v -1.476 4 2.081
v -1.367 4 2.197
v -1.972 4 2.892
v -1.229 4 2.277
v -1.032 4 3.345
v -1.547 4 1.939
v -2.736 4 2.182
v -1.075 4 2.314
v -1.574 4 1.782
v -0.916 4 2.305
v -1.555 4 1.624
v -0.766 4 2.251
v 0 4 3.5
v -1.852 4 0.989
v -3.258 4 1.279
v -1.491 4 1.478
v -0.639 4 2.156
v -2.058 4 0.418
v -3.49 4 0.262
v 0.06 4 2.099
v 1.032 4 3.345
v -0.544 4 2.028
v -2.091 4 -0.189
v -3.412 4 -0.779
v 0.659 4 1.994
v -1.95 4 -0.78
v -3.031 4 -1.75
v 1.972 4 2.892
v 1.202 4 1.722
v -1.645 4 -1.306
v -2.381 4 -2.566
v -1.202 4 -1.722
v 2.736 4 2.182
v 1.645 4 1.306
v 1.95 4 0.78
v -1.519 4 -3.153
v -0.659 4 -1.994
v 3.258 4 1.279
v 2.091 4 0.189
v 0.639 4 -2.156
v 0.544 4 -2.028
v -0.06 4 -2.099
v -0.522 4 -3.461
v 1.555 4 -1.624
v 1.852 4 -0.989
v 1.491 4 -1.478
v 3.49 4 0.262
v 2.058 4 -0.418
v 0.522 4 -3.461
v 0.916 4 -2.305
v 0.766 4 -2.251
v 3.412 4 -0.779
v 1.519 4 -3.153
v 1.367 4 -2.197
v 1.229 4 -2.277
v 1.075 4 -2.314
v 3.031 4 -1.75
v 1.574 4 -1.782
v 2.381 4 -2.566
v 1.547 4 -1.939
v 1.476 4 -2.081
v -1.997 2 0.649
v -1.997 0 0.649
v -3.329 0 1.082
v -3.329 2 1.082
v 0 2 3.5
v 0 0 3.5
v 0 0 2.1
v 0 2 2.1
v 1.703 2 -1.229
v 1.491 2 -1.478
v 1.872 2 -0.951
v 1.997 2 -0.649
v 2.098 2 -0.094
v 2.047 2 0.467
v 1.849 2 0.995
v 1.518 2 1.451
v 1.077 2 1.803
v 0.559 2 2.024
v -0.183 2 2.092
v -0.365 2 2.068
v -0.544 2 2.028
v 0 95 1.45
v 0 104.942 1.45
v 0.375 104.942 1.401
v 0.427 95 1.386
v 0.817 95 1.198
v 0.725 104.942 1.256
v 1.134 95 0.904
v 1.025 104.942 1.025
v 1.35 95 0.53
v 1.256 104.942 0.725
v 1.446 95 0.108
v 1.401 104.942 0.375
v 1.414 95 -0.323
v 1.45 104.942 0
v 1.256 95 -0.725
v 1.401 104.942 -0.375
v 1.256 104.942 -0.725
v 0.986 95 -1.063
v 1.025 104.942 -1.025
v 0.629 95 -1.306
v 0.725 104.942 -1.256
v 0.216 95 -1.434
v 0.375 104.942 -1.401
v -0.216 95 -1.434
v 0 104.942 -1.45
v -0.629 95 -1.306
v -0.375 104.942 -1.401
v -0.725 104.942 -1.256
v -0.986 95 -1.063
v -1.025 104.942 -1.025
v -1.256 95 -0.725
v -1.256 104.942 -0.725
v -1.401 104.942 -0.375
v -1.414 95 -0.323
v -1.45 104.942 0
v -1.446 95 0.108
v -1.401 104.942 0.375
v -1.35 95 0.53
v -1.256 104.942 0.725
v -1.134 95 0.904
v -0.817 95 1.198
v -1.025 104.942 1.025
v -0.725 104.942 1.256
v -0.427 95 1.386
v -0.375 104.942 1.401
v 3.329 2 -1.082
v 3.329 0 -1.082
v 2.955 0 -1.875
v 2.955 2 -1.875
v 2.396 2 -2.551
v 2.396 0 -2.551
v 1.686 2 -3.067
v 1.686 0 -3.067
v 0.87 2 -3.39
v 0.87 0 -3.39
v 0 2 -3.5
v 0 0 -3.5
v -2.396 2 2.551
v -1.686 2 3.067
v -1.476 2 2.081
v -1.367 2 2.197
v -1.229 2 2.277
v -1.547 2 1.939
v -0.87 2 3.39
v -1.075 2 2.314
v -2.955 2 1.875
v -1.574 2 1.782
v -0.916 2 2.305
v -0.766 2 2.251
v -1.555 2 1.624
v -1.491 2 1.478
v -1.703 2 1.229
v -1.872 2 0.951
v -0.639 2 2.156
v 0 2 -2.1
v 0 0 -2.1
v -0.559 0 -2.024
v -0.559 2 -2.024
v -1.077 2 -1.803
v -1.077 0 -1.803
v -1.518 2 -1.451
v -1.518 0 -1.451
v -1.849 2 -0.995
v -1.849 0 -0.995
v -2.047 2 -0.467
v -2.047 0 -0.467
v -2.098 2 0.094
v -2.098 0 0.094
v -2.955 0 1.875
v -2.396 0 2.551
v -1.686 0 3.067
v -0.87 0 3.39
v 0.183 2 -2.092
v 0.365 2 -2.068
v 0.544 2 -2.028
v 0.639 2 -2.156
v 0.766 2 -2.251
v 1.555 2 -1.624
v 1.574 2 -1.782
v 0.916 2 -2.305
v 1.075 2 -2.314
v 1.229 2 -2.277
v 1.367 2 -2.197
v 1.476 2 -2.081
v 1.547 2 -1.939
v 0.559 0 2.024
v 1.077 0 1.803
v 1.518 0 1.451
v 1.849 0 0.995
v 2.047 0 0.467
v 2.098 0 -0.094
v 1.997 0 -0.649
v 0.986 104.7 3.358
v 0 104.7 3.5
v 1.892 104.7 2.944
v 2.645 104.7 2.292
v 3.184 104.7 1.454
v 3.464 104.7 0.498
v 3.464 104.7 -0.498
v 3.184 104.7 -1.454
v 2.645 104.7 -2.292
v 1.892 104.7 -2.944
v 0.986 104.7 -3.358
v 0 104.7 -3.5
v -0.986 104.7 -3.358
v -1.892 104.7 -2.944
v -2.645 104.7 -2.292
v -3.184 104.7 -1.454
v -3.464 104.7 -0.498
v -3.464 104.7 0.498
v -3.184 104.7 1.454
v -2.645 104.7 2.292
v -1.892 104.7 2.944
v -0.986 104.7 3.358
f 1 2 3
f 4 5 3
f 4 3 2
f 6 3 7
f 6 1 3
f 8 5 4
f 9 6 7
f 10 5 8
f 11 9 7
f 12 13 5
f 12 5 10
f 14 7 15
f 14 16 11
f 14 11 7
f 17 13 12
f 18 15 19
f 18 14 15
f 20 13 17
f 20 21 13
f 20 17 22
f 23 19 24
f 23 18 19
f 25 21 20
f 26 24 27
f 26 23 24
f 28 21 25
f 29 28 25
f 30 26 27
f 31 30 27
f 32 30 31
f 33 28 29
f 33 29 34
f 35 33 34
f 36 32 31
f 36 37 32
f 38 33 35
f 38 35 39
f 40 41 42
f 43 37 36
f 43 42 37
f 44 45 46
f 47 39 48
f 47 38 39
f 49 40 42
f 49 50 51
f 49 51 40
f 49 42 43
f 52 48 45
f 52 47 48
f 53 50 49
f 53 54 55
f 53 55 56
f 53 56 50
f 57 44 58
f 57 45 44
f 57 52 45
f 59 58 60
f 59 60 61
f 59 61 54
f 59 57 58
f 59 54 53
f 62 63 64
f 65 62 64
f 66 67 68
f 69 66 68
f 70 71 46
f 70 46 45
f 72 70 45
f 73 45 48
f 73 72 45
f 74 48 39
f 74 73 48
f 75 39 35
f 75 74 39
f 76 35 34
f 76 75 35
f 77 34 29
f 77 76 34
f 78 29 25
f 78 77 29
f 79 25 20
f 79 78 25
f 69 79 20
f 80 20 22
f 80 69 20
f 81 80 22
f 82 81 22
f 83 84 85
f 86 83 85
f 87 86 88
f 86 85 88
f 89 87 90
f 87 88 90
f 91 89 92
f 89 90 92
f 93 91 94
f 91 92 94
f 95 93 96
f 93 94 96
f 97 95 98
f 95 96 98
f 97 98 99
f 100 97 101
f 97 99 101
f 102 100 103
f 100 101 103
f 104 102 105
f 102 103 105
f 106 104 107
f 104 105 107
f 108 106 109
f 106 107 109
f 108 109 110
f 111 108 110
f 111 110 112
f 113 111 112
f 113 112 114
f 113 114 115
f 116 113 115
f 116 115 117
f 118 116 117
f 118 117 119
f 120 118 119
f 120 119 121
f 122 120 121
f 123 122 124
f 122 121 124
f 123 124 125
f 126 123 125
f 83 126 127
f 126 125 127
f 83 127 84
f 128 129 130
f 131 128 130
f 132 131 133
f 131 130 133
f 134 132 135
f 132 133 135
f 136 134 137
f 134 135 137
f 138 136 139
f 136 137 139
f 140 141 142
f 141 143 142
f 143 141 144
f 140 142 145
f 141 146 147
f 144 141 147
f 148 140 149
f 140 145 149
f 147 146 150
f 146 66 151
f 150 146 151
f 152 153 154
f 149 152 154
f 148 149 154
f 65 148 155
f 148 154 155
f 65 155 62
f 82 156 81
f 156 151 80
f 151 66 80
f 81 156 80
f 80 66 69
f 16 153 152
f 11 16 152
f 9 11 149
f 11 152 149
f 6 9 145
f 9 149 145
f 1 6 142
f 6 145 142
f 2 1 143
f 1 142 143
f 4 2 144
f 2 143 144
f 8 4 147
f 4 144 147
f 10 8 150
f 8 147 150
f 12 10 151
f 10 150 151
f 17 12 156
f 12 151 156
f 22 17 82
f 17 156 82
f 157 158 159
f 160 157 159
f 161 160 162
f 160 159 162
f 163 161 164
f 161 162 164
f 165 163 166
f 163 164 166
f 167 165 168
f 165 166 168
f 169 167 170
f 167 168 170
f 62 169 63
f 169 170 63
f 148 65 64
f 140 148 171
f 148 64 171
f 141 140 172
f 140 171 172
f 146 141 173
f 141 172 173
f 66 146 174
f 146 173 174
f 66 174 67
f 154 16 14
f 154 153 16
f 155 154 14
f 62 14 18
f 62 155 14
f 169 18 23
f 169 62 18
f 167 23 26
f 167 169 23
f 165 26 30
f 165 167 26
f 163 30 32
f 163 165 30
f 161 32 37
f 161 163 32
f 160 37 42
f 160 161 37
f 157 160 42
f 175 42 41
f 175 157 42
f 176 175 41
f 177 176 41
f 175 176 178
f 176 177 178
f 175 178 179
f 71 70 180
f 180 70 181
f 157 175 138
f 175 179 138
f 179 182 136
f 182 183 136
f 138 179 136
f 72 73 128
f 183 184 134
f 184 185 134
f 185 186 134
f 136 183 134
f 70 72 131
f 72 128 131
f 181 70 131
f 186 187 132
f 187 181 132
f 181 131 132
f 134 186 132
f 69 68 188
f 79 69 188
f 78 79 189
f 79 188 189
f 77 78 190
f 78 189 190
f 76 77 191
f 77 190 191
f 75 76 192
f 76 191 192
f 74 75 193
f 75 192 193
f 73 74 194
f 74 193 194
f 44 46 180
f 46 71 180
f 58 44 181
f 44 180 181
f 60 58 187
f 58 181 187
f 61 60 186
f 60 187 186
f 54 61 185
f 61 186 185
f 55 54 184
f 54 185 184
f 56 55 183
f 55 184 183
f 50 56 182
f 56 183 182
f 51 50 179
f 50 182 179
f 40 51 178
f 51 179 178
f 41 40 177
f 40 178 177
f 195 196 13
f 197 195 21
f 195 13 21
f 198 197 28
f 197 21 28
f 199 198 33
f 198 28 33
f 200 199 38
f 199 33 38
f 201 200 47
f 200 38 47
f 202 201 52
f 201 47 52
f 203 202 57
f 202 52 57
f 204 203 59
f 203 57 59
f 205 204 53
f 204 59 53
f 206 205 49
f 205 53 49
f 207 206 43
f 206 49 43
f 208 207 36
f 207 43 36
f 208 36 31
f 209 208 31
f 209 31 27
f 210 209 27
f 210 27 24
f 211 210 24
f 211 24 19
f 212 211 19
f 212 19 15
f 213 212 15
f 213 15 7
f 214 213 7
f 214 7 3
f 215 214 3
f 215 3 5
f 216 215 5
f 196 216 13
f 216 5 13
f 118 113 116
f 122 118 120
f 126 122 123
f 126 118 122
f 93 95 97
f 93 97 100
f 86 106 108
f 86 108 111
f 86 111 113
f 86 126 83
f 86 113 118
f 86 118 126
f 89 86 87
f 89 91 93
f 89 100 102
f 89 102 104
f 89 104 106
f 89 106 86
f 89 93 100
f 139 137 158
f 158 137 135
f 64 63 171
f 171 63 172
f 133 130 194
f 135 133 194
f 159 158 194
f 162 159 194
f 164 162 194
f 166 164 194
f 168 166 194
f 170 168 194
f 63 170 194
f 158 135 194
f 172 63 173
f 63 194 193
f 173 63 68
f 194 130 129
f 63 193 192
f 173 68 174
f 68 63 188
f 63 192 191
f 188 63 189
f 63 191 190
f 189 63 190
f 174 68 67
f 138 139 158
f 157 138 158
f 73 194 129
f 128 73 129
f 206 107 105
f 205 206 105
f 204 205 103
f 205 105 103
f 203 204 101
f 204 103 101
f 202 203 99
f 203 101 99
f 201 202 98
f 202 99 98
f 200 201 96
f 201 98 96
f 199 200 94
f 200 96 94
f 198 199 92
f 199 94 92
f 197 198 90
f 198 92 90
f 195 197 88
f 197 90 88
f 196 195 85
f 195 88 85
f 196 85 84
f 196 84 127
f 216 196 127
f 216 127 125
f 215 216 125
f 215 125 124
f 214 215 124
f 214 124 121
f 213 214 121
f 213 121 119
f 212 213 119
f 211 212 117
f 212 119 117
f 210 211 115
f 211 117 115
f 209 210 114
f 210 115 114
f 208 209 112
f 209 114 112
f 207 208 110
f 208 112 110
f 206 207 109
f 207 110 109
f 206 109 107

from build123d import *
from build123d.topology import SkipClean

# Parameters (mm, degrees)
SKETCH_1_R          = 3.5
EXTRUDE_1_DEPTH     = 105
CUT_EXTRUDE_1_DEPTH = 2
SKETCH_3_R          = 3.5
SKETCH_3_R_2        = 2.1
CUT_EXTRUDE_3_DEPTH = 2
SKETCH_4_R          = 0.548210007
EXTRUDE_2_DEPTH     = 2
SKETCH_5_R          = 1.45
CUT_EXTRUDE_5_DEPTH = 10


with BuildPart() as part:
    # 草图1 → 凸台-拉伸1 (new body)
    with BuildSketch(Plane(origin=(0, 0, 0), x_dir=(1, 0, 0), z_dir=(0, 1, 0))):
        with Locations(Location((0, 0, 0), (0, 0, 270))):
            Circle(SKETCH_1_R)
    extrude(amount=EXTRUDE_1_DEPTH)

    # 草图2 → 切除-拉伸1 (cut)
    with BuildSketch(Plane.XZ):
        with BuildLine():
            Line((0, 3.5), (0, 2.1))
            ThreePointArc((0, 2.1), (1.698935688, 1.23434903), (1.997218684, -0.648935688))
            Line((1.997218684, -0.648935688), (3.328697807, -1.08155948))
            ThreePointArc((3.328697807, -1.08155948), (3.456909192, -0.547520628), (3.5, 0))
            ThreePointArc((3.5, 0), (2.474873734, 2.474873734), (0, 3.5))
        make_face()
        with BuildLine():
            ThreePointArc((0, -2.1), (-1.698935688, -1.23434903), (-1.997218684, 0.648935688))
            Line((-1.997218684, 0.648935688), (-3.328697807, 1.08155948))
            ThreePointArc((-3.328697807, 1.08155948), (-2.83155948, -2.057248383), (0, -3.5))
            Line((0, -3.5), (0, -2.1))
        make_face()
    extrude(amount=-CUT_EXTRUDE_1_DEPTH, mode=Mode.SUBTRACT)

    # 草图3 → 切除-拉伸3 (cut)
    with SkipClean():  # the faces are left unmerged after this step: merging them gives an invalid solid
        with BuildSketch(Plane.XZ.offset(-2)):
            with Locations(Location((0, 0, 0), (0, 0, 270))):
                Circle(SKETCH_3_R)
            with Locations(Location((0, 0, 0), (0, 0, 270))):
                Circle(SKETCH_3_R_2, mode=Mode.SUBTRACT)
        extrude(amount=-CUT_EXTRUDE_3_DEPTH, mode=Mode.SUBTRACT)

    # 草图4 → 凸台-拉伸2 (add)
    with BuildSketch(Plane(origin=(0, 2, 0), x_dir=(1, 0, 0), z_dir=(0, 1, 0))):
        with BuildLine():
            ThreePointArc((-1.491392248, -1.478427936), (-1.053967002, -1.816357222), (-0.543519995, -2.028444235))
            ThreePointArc((-0.543519995, -2.028444235), (-0.494470754, -1.90238195), (-0.477782325, -1.768146991))
            ThreePointArc((-0.477782325, -1.768146991), (-0.875331586, -1.241045908), (-1.491392248, -1.478427936))
        make_face()
        with BuildLine():
            ThreePointArc((-1.491392248, -1.478427936), (-1.301132932, -2.242311375), (-0.543519995, -2.028444235))
            ThreePointArc((-0.543519995, -2.028444235), (-1.053967002, -1.816357222), (-1.491392248, -1.478427936))
        make_face()
        with Locations((1.025992333, 1.768146991)):
            Circle(SKETCH_4_R)
    extrude(amount=EXTRUDE_2_DEPTH)

    # 草图5 → 切除-拉伸5 (cut)
    with BuildSketch(Plane(origin=(0, 105, 0), x_dir=(1, 0, 0), z_dir=(0, 1, 0))):
        with Locations(Location((0, 0, 0), (0, 0, 270))):
            Circle(SKETCH_5_R)
    extrude(amount=-CUT_EXTRUDE_5_DEPTH, mode=Mode.SUBTRACT)

    # 草图6 → 切除-旋转2 (revolve, cut)
    with BuildSketch(Plane.XY, mode=Mode.PRIVATE) as cut_revolve_2_sk:
        with BuildLine():
            Line((1.203106705, 105), (1.203106705, 104.958820899))
            add(Edge.make_bspline(
                [(3.5, 104.7), (2.737905529, 104.82566733), (1.972274431, 104.911940963), (1.203106705, 104.958820899)],
                knots=[0, 0, 0, 0, 0.657831992, 0.657831992, 0.657831992, 0.657831992], degree=3))
            Line((3.5, 104.7), (3.5, 105))
            Line((3.5, 105), (1.203106705, 105))
        make_face()
    revolve(cut_revolve_2_sk.sketch.rotate(Axis((0, 107.628853611, 0), (0, -1, 0)), 270), axis=Axis((0, 107.628853611, 0), (0, -1, 0)), mode=Mode.SUBTRACT)


solid = part.part
